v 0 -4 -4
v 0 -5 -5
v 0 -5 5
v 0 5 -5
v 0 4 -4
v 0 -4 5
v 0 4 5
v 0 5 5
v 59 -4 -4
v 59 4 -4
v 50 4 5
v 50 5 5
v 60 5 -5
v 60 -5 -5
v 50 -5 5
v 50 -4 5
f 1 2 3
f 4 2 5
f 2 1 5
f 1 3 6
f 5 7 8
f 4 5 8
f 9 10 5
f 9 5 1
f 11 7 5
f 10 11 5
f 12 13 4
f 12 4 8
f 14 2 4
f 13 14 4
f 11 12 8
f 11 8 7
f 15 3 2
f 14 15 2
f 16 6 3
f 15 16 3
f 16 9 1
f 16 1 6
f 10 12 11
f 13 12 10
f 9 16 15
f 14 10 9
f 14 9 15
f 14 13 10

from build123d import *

# Parameters (mm, degrees)
F1_DEPTH   = 60
F2_C1_SIZE = 9.9999


# Not quite as in the source:
# - a fillet or chamfer is up to 0.001 mm smaller than in the source, because OpenCascade refuses the exact size


with BuildPart() as f1:
    # F0 (on Right) → F1 (new body)
    with BuildSketch(Plane.YZ):
        Polygon((-4, 5), (-5, 5), (-5, -5), (5, -5), (5, 5), (4, 5), (4, -4), (-4, -4), align=None)
    extrude(amount=F1_DEPTH)

    # F2: chamfer of 10 on 2 edges, made by hand

    # F2_c1 (size 10 in the source; OpenCascade refuses exactly that, so slightly less here)
    f2_c1_edges = [f1.edges().sort_by_distance(p)[0] for p in [
        (60, -4.5, 5),
    ]]
    chamfer(f2_c1_edges, length=F2_C1_SIZE)


solid = f1.part
